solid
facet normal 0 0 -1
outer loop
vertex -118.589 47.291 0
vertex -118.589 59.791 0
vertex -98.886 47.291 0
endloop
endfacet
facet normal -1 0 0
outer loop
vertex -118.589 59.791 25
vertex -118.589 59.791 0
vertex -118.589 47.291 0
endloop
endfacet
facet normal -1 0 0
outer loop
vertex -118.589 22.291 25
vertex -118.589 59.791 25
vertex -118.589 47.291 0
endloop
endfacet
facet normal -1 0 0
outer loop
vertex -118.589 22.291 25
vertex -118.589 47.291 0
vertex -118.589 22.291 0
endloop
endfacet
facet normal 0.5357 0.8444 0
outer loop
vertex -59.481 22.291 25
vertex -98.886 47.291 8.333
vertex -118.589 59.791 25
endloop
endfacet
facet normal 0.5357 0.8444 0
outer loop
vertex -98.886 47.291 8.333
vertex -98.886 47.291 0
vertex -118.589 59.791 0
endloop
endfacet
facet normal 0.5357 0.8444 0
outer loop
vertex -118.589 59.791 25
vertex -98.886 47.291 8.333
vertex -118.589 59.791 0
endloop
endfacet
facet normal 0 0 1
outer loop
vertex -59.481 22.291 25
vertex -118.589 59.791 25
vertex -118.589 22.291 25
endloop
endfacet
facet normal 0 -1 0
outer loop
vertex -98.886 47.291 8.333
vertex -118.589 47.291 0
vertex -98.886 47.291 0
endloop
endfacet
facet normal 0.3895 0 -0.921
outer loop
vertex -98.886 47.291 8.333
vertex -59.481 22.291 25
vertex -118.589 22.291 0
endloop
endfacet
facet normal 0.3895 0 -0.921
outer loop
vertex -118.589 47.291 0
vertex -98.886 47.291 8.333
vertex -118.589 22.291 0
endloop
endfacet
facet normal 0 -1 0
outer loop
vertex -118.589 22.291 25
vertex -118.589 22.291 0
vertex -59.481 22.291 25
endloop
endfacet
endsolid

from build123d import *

# Parameters (mm, degrees)
F1_DEPTH = 25
F3_DEPTH = 25


with BuildPart() as f1:
    # F0 (on Top) → F1 (new body)
    with BuildSketch(Plane.XY):
        Polygon((-59.480719, 22.291102), (-118.588671, 59.791102), (-118.588671, 22.291102), align=None)
    extrude(amount=F1_DEPTH)

    # F2 (on face) → F3 (cut)
    with BuildSketch(Plane.XZ.offset(-22.291102)):
        Polygon((-59.480719, 25), (-118.588671, 0), (-59.480719, 0), align=None)
    extrude(amount=-F3_DEPTH, mode=Mode.SUBTRACT)


solid = f1.part
